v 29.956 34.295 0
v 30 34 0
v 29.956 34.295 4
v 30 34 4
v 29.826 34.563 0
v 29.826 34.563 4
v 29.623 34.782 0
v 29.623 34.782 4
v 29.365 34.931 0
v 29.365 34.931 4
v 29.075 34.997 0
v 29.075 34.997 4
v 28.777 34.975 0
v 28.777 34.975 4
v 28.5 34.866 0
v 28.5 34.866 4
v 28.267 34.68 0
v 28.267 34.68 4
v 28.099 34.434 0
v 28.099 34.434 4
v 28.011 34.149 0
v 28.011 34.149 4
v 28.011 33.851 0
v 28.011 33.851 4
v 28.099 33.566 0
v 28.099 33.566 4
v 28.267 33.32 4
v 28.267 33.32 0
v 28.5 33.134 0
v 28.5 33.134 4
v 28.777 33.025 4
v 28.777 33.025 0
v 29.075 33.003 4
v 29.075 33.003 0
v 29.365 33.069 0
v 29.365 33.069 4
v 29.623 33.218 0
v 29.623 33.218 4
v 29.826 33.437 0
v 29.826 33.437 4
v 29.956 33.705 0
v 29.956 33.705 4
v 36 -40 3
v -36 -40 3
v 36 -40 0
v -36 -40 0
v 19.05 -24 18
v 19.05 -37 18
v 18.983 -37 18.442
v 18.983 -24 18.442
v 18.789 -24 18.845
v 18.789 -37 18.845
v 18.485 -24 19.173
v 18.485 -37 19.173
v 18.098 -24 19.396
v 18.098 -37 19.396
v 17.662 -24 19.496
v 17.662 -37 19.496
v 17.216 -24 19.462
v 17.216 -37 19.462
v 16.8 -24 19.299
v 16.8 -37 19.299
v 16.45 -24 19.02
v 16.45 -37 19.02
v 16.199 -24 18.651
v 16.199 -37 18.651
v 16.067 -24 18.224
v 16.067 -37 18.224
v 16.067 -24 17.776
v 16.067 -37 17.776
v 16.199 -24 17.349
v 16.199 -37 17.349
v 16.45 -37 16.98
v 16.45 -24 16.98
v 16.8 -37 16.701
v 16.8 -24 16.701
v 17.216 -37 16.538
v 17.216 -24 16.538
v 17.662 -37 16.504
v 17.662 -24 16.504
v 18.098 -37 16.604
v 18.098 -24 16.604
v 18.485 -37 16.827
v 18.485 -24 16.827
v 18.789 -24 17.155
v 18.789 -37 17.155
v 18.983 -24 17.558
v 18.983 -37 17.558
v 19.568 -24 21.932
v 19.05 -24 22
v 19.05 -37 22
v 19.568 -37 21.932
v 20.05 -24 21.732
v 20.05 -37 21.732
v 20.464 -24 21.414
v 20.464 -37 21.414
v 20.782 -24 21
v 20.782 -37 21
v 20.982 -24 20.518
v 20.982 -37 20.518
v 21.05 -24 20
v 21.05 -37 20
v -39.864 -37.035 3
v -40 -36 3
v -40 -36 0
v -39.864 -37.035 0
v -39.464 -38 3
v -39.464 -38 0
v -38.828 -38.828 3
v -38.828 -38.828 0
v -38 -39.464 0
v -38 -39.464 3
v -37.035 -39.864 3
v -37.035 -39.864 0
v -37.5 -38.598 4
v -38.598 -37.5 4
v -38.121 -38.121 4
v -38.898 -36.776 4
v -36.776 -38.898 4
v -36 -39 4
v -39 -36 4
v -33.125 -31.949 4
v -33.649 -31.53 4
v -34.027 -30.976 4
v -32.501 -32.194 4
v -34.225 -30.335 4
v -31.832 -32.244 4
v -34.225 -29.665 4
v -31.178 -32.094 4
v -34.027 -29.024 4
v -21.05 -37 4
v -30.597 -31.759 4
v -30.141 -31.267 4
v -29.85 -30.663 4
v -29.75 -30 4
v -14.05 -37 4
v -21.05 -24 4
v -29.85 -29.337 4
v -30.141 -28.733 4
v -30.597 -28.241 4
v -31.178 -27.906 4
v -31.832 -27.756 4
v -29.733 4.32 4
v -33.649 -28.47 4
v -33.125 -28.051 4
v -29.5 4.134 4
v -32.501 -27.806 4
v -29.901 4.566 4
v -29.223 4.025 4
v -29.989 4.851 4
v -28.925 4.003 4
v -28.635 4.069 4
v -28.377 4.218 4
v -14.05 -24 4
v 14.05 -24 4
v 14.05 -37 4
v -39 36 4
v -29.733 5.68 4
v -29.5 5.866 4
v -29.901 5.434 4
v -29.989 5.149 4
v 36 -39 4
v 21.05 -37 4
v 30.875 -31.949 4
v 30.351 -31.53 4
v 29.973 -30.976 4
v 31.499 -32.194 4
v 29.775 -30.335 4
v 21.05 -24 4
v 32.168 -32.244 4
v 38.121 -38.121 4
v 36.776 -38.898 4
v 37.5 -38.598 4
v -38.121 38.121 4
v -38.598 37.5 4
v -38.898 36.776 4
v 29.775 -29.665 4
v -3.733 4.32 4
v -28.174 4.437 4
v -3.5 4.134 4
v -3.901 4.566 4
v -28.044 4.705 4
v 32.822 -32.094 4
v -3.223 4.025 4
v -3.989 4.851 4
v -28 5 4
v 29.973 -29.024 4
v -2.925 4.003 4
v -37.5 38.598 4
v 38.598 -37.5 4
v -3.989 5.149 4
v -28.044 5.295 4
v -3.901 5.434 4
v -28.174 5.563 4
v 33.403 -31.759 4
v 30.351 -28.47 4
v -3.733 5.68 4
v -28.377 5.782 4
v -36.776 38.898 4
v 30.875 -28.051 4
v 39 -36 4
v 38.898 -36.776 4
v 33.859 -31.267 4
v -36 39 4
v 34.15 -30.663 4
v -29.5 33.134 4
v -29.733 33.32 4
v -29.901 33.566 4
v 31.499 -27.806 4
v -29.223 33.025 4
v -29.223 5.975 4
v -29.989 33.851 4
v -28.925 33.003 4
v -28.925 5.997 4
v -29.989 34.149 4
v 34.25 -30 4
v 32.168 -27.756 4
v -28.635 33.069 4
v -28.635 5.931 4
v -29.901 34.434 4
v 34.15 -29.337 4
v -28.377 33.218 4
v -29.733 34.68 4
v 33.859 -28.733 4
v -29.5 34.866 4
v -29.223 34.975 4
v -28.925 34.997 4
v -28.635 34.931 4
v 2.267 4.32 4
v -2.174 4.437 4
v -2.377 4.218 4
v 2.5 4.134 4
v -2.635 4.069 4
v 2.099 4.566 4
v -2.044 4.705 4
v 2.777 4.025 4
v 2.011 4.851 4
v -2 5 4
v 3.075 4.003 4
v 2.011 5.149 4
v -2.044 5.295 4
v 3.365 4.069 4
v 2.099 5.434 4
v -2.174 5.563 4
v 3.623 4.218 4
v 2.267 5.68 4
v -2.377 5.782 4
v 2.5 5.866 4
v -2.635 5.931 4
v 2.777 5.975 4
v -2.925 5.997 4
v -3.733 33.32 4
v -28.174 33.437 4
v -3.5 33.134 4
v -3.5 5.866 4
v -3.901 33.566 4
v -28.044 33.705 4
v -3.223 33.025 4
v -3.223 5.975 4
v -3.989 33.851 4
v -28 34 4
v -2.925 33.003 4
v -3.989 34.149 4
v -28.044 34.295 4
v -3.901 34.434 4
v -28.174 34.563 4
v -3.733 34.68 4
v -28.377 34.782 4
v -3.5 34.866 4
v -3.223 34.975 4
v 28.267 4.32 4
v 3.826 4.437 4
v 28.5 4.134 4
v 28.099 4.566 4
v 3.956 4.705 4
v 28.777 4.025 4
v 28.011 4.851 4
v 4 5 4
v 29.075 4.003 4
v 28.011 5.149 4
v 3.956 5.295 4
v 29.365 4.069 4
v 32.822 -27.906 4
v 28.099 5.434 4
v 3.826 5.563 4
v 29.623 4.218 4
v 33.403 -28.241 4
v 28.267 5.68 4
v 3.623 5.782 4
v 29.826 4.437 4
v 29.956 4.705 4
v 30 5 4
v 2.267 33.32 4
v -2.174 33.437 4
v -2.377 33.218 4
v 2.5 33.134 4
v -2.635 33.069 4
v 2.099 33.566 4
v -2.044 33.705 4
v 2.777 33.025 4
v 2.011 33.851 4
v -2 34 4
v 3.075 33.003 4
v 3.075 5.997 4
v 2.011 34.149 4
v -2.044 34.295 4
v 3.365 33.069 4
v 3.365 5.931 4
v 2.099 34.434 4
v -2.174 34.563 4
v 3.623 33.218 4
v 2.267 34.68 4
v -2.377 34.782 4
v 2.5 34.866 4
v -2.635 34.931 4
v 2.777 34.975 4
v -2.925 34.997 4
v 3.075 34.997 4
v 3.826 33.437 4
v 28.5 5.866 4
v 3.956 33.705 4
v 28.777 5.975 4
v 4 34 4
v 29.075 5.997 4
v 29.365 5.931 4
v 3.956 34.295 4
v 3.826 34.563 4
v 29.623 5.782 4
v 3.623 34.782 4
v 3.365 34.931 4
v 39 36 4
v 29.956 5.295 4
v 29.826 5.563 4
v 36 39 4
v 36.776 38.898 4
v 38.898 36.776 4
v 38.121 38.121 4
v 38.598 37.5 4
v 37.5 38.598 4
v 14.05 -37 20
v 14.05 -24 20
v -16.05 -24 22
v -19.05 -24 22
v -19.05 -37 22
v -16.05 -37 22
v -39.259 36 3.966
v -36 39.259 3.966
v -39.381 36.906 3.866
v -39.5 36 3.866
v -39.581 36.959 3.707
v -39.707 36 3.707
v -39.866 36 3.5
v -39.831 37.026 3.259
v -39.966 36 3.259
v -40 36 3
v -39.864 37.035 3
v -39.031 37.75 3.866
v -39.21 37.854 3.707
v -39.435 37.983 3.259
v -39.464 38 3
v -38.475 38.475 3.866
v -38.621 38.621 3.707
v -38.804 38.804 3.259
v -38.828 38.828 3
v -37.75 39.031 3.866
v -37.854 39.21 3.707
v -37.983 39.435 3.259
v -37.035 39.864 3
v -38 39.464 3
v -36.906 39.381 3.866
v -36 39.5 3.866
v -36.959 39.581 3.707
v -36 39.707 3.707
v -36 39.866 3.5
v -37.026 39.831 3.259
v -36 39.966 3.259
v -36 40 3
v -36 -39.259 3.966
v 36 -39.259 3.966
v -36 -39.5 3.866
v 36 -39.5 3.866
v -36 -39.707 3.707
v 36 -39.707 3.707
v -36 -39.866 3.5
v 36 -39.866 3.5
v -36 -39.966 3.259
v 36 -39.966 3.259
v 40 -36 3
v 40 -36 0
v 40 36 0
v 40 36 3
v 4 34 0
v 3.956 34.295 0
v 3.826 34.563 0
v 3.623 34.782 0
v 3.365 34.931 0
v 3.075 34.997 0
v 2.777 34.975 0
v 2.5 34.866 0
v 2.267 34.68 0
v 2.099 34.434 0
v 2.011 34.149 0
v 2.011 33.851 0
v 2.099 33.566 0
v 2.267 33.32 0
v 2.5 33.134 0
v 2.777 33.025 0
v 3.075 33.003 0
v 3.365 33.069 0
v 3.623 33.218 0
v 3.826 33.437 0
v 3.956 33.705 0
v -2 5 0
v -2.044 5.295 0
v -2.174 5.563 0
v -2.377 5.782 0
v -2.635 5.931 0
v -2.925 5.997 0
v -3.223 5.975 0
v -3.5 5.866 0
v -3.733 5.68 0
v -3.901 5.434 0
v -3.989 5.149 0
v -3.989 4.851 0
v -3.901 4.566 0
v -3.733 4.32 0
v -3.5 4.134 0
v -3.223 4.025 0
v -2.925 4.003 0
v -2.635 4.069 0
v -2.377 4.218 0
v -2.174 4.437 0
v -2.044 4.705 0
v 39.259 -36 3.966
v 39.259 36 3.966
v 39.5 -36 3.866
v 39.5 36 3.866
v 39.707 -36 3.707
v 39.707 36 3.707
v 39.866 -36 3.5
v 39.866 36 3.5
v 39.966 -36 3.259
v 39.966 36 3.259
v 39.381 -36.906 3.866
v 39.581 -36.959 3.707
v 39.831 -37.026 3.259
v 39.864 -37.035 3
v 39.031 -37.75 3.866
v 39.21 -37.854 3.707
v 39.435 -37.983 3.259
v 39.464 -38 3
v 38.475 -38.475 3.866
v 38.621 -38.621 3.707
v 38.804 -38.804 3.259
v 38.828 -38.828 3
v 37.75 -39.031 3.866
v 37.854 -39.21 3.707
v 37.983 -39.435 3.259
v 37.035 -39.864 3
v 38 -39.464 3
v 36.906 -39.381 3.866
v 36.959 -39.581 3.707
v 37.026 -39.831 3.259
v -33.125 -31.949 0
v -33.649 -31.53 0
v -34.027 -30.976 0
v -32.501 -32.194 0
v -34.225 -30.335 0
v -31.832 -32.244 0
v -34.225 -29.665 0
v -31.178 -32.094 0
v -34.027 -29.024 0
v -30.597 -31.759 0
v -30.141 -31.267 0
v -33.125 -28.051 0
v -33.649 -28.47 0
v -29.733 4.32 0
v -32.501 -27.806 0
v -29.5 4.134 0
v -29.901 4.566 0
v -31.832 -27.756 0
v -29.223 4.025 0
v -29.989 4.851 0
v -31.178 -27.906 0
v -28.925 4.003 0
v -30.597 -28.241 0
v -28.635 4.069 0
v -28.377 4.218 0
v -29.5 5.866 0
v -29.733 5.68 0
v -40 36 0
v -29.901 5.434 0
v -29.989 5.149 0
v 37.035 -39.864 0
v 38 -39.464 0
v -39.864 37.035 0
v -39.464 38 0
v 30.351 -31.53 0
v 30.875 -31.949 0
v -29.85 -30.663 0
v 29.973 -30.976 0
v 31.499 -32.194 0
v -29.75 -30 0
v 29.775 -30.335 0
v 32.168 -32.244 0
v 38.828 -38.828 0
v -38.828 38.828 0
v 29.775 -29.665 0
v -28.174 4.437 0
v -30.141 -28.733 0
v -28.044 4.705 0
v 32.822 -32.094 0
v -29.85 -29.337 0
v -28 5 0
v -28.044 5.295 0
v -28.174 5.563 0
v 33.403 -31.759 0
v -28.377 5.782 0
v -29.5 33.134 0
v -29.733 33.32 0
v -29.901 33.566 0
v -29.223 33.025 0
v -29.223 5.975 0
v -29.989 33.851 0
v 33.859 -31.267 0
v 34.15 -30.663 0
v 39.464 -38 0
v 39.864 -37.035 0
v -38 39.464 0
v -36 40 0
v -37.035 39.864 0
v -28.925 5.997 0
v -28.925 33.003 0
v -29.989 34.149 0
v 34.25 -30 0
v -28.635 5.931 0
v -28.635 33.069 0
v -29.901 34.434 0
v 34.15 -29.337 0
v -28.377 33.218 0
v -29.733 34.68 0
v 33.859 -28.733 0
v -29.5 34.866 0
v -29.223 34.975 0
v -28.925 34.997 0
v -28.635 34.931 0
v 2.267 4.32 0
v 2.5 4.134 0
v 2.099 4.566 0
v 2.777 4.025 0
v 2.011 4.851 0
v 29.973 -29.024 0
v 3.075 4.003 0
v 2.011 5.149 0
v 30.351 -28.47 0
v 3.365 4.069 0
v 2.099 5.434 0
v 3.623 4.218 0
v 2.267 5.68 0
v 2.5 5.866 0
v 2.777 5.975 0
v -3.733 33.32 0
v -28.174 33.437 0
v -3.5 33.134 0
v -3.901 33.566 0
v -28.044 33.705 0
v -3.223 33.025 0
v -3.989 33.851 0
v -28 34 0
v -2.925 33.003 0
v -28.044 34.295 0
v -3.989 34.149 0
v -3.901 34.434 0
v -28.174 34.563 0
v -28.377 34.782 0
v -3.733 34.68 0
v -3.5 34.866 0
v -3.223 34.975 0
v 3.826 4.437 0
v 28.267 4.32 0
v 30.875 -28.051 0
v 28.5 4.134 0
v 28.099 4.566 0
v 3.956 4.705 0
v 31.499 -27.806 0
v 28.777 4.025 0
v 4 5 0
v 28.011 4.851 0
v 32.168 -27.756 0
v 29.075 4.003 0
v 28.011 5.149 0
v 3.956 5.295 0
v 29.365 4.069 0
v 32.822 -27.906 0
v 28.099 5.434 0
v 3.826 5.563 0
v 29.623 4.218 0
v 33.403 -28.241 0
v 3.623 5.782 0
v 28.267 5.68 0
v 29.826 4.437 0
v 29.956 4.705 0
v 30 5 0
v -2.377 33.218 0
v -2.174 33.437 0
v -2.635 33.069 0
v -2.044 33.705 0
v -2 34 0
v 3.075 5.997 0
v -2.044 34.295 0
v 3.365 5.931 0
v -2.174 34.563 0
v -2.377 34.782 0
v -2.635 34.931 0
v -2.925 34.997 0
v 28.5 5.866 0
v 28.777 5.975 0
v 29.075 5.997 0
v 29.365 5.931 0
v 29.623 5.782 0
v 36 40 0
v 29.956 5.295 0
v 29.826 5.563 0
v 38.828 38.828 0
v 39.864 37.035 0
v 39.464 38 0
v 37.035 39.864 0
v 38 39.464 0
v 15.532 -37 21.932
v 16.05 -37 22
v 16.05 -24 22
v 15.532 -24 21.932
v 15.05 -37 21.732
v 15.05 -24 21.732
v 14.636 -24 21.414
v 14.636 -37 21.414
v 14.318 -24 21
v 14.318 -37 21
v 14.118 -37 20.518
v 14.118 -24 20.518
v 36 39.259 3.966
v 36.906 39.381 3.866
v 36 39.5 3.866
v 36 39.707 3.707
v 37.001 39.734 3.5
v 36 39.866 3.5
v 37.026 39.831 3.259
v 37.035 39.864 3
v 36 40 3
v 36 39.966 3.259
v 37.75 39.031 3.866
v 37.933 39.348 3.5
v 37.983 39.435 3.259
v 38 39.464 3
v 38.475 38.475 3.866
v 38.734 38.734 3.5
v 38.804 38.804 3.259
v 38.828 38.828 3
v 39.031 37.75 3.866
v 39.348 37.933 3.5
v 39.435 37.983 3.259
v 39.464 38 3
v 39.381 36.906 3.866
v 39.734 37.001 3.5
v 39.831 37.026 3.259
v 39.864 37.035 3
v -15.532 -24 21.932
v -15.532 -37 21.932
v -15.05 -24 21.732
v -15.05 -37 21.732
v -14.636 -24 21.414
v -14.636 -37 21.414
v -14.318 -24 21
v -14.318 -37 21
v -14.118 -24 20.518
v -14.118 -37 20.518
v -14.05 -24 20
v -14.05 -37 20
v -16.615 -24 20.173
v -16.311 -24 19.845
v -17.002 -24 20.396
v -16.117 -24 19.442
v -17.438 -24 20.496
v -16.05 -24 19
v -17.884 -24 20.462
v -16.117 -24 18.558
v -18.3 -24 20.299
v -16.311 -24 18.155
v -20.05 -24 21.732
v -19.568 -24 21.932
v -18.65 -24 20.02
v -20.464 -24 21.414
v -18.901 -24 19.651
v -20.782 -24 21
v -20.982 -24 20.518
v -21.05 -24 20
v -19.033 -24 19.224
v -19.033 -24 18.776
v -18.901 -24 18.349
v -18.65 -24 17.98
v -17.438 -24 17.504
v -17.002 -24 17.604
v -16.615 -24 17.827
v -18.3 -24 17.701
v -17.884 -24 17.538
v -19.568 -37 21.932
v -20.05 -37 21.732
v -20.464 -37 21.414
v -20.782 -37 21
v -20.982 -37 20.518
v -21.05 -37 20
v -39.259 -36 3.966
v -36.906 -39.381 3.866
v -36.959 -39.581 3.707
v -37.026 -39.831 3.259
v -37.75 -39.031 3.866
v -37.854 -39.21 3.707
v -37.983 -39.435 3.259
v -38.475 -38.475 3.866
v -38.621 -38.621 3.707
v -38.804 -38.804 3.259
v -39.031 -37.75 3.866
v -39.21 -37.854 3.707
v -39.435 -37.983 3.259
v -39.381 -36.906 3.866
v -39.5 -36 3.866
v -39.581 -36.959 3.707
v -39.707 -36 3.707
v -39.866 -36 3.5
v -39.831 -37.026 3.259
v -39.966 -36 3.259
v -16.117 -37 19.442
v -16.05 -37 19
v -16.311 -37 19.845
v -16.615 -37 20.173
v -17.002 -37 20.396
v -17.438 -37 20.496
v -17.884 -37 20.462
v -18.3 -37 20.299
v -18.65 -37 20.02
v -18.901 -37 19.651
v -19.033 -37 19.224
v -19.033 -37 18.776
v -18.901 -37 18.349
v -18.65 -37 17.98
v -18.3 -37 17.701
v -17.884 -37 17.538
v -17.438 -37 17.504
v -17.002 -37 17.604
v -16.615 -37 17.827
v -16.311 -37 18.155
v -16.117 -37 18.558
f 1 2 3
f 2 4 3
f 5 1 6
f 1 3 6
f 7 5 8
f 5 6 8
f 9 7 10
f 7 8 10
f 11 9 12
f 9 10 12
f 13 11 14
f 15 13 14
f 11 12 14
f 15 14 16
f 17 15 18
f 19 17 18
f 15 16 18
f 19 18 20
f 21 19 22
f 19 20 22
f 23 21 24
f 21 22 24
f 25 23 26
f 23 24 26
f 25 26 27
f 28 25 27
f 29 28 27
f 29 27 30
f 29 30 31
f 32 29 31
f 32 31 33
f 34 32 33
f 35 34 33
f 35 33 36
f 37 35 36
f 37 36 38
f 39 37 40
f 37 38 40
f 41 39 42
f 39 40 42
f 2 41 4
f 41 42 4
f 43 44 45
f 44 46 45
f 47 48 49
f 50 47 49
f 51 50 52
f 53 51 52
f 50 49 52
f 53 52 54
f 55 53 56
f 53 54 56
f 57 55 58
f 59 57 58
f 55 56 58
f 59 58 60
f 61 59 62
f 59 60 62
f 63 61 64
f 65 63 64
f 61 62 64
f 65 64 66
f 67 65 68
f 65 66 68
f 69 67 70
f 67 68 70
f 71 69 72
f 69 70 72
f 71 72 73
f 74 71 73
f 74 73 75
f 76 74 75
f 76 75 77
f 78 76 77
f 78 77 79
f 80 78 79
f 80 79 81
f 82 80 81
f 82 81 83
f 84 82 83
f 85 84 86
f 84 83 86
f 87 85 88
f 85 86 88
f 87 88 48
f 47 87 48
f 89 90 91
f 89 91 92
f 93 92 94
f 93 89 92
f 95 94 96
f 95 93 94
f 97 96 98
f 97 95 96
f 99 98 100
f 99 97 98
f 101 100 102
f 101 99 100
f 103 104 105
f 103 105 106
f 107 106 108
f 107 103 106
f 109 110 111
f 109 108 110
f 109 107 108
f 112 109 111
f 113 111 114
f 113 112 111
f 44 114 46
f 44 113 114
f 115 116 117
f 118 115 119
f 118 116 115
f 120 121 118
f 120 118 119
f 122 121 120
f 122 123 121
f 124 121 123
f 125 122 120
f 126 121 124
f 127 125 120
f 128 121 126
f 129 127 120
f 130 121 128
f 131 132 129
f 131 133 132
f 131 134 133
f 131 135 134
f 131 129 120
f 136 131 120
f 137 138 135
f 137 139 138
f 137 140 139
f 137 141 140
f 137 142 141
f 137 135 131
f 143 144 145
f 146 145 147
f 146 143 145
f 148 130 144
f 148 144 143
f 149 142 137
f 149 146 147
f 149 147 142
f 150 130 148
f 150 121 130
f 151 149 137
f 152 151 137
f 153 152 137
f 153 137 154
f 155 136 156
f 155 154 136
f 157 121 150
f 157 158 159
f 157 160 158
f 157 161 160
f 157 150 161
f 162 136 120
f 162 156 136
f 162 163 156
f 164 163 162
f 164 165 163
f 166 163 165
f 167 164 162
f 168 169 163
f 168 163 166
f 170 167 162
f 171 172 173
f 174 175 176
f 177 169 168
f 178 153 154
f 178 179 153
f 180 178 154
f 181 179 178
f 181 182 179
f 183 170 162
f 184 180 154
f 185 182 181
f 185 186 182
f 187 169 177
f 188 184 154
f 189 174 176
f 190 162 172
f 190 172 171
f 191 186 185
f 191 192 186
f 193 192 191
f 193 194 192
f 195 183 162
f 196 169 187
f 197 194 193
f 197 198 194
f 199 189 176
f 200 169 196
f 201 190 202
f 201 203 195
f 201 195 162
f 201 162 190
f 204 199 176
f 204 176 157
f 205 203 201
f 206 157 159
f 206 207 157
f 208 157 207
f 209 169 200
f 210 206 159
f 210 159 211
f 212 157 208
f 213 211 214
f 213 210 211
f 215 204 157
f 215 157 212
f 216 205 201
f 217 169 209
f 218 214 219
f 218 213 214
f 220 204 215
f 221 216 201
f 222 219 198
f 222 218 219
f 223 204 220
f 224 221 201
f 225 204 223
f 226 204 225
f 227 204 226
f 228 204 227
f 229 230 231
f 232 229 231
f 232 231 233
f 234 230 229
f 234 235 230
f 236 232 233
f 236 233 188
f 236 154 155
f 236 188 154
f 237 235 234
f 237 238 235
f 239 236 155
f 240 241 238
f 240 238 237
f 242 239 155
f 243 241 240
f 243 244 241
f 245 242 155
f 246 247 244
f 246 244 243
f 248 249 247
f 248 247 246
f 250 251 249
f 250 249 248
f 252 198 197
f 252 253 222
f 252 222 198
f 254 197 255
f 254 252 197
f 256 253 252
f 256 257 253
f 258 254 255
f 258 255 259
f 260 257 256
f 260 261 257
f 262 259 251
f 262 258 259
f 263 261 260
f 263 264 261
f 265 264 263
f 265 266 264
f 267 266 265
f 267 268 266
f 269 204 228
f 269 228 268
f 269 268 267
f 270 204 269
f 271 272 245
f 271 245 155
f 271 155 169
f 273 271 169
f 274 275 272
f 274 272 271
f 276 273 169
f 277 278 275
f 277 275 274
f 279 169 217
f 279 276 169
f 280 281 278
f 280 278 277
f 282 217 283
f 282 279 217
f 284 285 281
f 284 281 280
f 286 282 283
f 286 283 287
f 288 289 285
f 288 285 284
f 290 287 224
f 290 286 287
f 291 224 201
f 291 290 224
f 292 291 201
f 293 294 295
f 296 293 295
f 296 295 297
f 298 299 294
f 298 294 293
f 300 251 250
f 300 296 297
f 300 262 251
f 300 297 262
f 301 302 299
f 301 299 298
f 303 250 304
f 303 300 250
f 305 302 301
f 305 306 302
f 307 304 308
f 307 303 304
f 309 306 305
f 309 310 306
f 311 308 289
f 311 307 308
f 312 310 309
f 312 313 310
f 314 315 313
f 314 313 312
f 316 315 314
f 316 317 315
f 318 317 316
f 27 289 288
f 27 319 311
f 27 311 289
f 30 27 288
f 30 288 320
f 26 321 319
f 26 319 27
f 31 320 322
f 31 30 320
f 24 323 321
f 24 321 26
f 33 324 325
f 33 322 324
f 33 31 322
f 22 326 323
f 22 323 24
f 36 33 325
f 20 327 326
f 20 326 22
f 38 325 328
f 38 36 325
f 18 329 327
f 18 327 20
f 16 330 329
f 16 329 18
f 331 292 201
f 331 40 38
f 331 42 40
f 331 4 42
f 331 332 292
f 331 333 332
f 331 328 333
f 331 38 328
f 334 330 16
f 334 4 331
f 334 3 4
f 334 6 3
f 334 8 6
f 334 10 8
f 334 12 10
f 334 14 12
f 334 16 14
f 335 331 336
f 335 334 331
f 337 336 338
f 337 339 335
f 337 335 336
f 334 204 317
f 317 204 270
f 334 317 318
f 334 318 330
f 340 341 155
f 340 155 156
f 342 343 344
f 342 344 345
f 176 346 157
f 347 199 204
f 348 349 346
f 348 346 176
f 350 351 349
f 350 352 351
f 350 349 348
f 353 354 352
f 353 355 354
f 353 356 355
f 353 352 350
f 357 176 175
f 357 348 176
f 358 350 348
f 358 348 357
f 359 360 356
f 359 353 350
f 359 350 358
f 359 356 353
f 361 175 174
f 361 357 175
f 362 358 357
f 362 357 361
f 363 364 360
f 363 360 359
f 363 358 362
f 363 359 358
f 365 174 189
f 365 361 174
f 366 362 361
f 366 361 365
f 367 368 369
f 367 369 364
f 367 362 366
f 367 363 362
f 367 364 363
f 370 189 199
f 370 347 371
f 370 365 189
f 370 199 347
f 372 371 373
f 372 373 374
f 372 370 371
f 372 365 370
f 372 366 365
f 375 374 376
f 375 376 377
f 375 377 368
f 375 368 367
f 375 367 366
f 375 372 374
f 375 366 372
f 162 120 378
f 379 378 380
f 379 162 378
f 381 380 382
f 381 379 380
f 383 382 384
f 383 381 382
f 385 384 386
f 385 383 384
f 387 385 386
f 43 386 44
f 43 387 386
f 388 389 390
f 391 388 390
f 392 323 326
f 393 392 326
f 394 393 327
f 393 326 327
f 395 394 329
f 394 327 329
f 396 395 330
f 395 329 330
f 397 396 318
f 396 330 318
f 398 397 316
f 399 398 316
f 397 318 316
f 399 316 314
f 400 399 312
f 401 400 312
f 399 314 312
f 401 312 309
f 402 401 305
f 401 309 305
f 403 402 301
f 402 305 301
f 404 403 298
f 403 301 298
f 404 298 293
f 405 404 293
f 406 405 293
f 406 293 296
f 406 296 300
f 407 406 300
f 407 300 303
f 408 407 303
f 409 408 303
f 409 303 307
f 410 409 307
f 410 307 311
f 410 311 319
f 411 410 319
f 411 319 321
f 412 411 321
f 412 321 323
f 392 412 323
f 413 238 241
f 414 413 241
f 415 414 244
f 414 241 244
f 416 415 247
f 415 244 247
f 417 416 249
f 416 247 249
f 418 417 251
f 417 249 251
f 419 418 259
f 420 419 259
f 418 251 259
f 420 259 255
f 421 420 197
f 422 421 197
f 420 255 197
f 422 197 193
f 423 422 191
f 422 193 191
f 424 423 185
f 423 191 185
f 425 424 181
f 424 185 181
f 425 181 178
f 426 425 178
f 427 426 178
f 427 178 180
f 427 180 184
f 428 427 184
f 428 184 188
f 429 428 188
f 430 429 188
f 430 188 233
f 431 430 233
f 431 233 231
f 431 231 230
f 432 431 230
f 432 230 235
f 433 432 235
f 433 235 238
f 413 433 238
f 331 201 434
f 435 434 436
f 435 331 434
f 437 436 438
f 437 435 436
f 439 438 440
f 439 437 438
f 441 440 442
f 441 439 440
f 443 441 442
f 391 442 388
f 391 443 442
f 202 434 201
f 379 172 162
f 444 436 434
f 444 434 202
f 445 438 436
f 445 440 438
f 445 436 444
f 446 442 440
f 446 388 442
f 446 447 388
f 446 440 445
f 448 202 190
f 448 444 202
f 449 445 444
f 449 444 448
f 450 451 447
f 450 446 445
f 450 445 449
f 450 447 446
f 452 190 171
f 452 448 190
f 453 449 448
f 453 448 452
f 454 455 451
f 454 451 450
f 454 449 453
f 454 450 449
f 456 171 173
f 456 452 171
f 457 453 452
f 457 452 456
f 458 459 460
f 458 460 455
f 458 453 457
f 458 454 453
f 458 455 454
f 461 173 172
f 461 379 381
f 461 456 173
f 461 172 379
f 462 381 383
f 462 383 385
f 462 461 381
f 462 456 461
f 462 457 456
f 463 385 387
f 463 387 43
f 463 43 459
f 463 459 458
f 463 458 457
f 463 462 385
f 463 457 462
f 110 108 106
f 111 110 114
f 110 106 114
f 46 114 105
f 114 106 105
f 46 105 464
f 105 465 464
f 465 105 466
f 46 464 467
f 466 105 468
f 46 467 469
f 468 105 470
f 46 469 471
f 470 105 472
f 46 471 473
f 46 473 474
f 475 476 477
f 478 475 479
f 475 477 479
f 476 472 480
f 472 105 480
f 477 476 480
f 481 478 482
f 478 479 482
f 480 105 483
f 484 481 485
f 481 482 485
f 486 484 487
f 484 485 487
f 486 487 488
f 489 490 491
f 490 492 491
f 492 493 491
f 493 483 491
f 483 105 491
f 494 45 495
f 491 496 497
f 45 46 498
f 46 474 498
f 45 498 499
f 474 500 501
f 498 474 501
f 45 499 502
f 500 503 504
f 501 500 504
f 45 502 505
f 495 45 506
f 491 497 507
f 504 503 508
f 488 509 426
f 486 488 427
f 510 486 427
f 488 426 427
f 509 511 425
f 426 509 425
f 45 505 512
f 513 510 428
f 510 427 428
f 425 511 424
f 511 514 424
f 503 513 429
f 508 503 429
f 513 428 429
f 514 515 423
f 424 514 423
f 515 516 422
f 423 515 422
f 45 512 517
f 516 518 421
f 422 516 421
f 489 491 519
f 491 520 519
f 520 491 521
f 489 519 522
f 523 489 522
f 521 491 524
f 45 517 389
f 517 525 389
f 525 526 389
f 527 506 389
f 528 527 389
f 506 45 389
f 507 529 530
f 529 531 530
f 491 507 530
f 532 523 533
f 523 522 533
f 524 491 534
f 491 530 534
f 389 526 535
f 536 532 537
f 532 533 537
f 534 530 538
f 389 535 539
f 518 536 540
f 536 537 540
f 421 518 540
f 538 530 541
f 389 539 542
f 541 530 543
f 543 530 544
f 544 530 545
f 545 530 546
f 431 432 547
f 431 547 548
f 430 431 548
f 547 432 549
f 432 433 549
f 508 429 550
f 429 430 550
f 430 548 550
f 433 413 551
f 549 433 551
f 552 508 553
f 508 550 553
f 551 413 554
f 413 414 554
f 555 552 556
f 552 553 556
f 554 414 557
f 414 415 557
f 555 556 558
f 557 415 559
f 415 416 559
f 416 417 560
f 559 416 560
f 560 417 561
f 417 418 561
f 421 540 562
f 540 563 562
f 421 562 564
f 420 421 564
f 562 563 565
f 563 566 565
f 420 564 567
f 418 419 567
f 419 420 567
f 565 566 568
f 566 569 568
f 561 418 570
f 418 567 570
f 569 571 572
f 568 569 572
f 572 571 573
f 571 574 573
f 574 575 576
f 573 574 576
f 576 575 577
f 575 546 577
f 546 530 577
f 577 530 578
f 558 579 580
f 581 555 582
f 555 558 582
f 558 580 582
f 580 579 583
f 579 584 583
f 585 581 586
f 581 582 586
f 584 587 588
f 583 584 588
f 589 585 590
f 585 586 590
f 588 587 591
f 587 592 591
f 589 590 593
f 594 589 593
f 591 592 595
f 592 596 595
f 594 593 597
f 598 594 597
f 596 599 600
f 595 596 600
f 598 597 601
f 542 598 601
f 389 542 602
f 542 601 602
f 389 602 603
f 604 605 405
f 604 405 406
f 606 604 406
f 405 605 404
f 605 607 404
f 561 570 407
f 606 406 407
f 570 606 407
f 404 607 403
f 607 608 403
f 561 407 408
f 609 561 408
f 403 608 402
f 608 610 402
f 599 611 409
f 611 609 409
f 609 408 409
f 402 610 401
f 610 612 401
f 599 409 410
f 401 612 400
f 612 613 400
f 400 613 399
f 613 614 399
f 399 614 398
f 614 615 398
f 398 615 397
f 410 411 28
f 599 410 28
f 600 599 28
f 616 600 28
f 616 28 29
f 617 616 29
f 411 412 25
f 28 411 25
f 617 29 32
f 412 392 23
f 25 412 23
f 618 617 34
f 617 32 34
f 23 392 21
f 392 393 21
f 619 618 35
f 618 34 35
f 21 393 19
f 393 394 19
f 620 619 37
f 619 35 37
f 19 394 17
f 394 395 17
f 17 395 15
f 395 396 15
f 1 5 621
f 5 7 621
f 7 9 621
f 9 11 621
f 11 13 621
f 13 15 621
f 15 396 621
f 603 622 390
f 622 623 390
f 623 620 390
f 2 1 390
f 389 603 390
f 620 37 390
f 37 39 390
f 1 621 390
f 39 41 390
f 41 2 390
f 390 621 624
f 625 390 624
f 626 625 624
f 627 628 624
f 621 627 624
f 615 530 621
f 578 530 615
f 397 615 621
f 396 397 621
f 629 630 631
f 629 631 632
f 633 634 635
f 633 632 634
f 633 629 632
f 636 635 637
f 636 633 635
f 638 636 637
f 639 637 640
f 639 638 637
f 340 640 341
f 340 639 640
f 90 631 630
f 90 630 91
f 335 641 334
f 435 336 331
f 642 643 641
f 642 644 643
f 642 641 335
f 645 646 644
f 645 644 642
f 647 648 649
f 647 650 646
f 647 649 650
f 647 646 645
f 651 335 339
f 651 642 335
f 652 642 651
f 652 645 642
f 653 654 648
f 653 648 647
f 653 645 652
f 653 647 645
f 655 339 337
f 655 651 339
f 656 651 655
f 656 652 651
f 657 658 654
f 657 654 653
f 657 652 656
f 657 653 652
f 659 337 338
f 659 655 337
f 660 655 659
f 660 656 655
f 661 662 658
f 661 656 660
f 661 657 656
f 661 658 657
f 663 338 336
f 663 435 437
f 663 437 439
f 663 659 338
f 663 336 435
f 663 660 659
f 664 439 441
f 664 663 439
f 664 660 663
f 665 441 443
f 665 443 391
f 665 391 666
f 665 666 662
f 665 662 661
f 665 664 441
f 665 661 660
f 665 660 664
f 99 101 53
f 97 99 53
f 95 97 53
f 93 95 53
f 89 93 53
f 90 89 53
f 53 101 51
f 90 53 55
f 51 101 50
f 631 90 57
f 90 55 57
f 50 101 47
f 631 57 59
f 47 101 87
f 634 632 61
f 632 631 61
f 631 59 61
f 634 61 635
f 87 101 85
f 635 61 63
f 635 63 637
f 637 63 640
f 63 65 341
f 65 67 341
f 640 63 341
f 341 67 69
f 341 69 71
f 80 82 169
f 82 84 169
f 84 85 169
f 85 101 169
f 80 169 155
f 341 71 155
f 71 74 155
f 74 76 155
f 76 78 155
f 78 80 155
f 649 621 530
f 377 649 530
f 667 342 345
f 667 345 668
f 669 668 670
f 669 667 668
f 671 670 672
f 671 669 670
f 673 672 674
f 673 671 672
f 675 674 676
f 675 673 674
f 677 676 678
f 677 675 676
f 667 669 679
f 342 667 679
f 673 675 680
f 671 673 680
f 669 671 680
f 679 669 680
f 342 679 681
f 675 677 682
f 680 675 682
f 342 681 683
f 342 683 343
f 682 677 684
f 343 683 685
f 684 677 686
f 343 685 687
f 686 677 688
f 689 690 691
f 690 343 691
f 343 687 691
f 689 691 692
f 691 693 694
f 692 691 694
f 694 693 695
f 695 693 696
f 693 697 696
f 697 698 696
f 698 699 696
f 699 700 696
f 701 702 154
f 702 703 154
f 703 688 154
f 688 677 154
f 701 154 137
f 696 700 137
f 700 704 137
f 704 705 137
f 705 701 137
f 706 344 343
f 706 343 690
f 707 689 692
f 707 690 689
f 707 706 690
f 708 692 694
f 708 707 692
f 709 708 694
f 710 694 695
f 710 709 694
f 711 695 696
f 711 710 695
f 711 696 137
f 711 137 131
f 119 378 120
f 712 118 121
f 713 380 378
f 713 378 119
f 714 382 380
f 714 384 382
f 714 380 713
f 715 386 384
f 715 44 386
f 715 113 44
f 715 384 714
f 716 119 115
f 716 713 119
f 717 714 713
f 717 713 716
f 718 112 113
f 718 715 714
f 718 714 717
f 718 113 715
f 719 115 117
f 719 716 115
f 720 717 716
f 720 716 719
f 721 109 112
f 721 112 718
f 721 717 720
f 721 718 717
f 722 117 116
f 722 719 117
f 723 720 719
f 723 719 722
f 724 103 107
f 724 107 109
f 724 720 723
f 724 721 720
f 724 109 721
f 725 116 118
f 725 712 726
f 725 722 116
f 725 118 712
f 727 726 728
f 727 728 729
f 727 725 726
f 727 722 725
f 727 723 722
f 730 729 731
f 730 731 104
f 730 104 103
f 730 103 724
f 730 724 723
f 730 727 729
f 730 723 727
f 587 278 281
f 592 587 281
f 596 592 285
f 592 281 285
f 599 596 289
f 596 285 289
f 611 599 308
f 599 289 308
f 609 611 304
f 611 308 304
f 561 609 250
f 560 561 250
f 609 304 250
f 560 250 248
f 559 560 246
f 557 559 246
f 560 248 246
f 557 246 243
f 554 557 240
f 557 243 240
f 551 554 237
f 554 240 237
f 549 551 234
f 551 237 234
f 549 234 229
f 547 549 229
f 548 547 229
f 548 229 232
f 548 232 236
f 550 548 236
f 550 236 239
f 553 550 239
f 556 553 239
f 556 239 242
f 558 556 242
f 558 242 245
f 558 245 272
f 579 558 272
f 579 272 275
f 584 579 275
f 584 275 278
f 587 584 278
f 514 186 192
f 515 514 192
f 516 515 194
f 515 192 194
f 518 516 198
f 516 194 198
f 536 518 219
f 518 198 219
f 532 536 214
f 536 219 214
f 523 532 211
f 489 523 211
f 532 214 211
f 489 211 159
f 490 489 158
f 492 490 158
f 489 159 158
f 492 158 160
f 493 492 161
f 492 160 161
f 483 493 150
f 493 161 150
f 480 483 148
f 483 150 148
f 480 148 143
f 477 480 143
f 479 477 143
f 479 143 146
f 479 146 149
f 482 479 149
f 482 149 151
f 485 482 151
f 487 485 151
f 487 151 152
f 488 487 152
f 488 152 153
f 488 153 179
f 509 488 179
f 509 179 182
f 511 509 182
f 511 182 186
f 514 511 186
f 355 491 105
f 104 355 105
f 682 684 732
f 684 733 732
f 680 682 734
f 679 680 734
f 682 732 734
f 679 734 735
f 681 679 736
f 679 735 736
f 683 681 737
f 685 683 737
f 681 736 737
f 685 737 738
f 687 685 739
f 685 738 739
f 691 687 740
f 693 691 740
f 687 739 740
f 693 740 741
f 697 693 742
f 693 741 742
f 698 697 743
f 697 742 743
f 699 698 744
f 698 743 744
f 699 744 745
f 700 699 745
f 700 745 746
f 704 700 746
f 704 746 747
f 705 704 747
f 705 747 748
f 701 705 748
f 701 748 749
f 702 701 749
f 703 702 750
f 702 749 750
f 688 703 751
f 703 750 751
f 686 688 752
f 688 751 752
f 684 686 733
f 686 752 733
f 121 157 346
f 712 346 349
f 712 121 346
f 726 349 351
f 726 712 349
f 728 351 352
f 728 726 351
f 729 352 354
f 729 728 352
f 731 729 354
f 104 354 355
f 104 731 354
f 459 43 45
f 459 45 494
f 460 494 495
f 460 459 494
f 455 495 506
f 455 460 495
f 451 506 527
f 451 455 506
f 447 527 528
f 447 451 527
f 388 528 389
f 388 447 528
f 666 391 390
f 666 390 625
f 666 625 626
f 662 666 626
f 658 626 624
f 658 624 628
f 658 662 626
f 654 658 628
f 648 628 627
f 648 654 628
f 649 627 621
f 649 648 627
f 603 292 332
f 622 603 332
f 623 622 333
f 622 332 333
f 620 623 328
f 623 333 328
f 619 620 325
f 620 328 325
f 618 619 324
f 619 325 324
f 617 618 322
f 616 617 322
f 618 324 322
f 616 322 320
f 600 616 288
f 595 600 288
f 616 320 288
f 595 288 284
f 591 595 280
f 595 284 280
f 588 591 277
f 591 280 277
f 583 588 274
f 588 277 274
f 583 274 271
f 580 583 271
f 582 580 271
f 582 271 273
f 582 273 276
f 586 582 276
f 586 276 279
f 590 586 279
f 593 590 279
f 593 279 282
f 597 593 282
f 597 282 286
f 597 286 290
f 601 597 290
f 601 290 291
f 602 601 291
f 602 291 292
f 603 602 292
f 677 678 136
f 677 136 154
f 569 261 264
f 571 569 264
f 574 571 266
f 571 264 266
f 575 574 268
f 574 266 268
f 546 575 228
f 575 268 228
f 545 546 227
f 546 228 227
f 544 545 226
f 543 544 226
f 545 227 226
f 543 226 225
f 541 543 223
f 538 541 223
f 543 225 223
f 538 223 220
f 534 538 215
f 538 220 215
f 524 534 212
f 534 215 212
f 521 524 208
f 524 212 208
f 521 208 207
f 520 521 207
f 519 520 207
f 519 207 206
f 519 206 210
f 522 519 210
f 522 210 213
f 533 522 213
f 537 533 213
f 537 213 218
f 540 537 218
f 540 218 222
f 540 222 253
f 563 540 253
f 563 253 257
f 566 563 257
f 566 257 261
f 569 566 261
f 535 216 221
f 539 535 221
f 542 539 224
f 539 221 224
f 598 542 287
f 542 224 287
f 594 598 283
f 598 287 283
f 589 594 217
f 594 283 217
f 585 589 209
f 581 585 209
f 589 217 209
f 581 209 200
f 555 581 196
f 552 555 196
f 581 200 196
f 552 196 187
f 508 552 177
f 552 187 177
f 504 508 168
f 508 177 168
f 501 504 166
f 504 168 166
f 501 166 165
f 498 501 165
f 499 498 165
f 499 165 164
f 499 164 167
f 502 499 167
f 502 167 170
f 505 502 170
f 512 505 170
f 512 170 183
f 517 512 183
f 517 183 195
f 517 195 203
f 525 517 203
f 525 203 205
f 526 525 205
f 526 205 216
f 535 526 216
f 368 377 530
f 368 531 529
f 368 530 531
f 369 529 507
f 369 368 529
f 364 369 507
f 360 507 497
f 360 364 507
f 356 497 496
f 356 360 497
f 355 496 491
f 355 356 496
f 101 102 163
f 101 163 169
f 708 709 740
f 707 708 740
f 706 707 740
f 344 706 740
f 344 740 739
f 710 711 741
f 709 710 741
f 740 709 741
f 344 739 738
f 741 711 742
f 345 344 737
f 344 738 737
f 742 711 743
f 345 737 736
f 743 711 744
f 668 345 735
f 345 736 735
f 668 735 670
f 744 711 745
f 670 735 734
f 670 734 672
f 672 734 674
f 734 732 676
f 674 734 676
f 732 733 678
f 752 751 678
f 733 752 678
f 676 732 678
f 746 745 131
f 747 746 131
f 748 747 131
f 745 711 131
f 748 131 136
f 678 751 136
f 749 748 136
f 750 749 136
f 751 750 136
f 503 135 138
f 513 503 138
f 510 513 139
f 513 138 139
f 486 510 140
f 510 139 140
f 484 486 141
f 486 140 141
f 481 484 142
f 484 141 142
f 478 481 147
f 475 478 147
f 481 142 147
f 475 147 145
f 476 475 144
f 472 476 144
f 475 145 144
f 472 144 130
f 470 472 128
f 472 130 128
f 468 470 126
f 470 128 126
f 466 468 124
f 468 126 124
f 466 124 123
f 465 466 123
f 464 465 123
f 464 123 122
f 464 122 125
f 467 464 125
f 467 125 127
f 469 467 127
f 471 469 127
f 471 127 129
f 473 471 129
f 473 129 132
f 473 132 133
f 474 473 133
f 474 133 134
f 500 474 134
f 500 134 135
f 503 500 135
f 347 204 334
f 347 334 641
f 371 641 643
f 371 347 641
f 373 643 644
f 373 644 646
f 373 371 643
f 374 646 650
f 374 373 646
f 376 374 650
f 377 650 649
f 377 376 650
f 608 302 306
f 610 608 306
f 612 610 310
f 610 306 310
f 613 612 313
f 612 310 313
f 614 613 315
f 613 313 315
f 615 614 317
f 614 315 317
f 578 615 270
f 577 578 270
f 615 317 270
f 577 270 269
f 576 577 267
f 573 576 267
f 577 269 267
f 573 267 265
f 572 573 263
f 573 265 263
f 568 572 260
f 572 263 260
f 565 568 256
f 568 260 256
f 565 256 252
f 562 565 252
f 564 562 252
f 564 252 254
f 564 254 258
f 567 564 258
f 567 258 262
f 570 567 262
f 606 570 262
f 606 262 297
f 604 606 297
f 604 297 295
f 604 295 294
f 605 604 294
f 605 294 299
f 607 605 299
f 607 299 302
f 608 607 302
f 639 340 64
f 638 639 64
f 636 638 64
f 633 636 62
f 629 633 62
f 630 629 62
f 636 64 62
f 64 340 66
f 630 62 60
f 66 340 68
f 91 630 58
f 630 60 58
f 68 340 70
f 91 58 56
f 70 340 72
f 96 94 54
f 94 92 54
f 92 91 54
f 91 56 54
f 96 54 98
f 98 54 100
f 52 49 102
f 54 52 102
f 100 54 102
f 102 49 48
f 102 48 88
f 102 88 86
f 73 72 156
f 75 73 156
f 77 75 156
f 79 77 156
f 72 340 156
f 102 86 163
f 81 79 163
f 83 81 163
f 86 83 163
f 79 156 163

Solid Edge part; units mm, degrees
sketch "Sketch1" plane through (0, 0, 0) normal (0, 0, 1) x (1, 0, 0)
  line L0 (-40, -40) -> (40, -40)
  line L1 (40, -40) -> (40, 40)
  line L2 (40, 40) -> (-40, 40)
  line L3 (-40, 40) -> (-40, -40)
extrude "Protrusion1" add sketch "Sketch1" along normal blind 4
sketch "Sketch2" plane through (0, 0, 4) normal (0, 0, 1) x (1, 0, 0)
  line L0 (-14.05, -37) -> (-14.05, -24)
  line L1 (-14.05, -24) -> (-21.05, -24)
  line L2 (-21.05, -24) -> (-21.05, -37)
  line L3 (-21.05, -37) -> (-14.05, -37)
  line L4 (14.05, -24) -> (14.05, -37)
  line L5 (14.05, -37) -> (21.05, -37)
  line L6 (21.05, -37) -> (21.05, -24)
  line L7 (21.05, -24) -> (14.05, -24)
  dimension "D1" = 13
  dimension "D2" = 7
  dimension "D3" = 13
  dimension "D4" = 7
  dimension "D5" = 28.1
  dimension "D6" = 14.05
  dimension "D7" = 3
  dimension "D8" = 3
extrude "Extrusionsausprägung_2" add sketch "Sketch2" along normal blind 18
sketch "Sketch3" plane through (-18.15, -37, 13) normal (0, -1, 0) x (1, 0, 0)
  circle A0 centre (0.6, 6) radius 1.5
extrude "Extrusionsausschnitt_1" cut sketch "Sketch3" against normal blind 38.6
sketch "Sketch4" plane through (18.15, -37, 13) normal (0, -1, 0) x (1, 0, 0)
  circle A0 centre (-0.6, 5) radius 1.5
extrude "Extrusionsausschnitt_2" cut sketch "Sketch4" against normal blind 51.3
fillet "Verrundung_1" radius 2 4 edges at (-21.05, -30.5, 22) (-14.05, -30.5, 22) (14.05, -30.5, 22) (21.05, -30.5, 22)
sketch "Sketch5" plane through (0, 0, 4) normal (0, 0, 1) x (1, 0, 0)
  circle A0 centre (32, -30) radius 2.25
  circle A1 centre (29, 5) radius 1
  circle A2 centre (29, 34) radius 1
  circle A3 centre (3, 5) radius 1
  circle A4 centre (-3, 5) radius 1
  circle A5 centre (3, 34) radius 1
  circle A6 centre (-3, 34) radius 1
  circle A7 centre (-29, 34) radius 1
  circle A8 centre (-29, 5) radius 1
  circle A9 centre (-32, -30) radius 2.25
  dimension "D1" = 2
  dimension "D2" = 2
  dimension "D3" = 2
  dimension "D4" = 2
  dimension "D5" = 26
  dimension "D6" = 29
  dimension "D7" = 2
  dimension "D8" = 2
  dimension "D9" = 2
  dimension "D10" = 2
  dimension "D11" = 29
  dimension "D12" = 26
  dimension "D13" = 6
  dimension "D14" = 45
  dimension "D15" = 3
  dimension "D16" = 4.5
  dimension "D17" = 4.5
  dimension "D18" = 8
  dimension "D19" = 8
  dimension "D20" = 10
extrude "Cutout1" cut sketch "Sketch5" against normal blind 112.1
fillet "Verrundung_2" radius 4 4 edges at (-40, 40, 2) (-40, -40, 2) (40, -40, 2) (40, 40, 2)
fillet "Verrundung_3" radius 1 8 edges at (0, 40, 4) (-38.8284, 38.8284, 4) (-40, 0, 4) (-38.8284, -38.8284, 4) (0, -40, 4) (38.8284, -38.8284, 4) (40, 0, 4) (38.8284, 38.8284, 4)
